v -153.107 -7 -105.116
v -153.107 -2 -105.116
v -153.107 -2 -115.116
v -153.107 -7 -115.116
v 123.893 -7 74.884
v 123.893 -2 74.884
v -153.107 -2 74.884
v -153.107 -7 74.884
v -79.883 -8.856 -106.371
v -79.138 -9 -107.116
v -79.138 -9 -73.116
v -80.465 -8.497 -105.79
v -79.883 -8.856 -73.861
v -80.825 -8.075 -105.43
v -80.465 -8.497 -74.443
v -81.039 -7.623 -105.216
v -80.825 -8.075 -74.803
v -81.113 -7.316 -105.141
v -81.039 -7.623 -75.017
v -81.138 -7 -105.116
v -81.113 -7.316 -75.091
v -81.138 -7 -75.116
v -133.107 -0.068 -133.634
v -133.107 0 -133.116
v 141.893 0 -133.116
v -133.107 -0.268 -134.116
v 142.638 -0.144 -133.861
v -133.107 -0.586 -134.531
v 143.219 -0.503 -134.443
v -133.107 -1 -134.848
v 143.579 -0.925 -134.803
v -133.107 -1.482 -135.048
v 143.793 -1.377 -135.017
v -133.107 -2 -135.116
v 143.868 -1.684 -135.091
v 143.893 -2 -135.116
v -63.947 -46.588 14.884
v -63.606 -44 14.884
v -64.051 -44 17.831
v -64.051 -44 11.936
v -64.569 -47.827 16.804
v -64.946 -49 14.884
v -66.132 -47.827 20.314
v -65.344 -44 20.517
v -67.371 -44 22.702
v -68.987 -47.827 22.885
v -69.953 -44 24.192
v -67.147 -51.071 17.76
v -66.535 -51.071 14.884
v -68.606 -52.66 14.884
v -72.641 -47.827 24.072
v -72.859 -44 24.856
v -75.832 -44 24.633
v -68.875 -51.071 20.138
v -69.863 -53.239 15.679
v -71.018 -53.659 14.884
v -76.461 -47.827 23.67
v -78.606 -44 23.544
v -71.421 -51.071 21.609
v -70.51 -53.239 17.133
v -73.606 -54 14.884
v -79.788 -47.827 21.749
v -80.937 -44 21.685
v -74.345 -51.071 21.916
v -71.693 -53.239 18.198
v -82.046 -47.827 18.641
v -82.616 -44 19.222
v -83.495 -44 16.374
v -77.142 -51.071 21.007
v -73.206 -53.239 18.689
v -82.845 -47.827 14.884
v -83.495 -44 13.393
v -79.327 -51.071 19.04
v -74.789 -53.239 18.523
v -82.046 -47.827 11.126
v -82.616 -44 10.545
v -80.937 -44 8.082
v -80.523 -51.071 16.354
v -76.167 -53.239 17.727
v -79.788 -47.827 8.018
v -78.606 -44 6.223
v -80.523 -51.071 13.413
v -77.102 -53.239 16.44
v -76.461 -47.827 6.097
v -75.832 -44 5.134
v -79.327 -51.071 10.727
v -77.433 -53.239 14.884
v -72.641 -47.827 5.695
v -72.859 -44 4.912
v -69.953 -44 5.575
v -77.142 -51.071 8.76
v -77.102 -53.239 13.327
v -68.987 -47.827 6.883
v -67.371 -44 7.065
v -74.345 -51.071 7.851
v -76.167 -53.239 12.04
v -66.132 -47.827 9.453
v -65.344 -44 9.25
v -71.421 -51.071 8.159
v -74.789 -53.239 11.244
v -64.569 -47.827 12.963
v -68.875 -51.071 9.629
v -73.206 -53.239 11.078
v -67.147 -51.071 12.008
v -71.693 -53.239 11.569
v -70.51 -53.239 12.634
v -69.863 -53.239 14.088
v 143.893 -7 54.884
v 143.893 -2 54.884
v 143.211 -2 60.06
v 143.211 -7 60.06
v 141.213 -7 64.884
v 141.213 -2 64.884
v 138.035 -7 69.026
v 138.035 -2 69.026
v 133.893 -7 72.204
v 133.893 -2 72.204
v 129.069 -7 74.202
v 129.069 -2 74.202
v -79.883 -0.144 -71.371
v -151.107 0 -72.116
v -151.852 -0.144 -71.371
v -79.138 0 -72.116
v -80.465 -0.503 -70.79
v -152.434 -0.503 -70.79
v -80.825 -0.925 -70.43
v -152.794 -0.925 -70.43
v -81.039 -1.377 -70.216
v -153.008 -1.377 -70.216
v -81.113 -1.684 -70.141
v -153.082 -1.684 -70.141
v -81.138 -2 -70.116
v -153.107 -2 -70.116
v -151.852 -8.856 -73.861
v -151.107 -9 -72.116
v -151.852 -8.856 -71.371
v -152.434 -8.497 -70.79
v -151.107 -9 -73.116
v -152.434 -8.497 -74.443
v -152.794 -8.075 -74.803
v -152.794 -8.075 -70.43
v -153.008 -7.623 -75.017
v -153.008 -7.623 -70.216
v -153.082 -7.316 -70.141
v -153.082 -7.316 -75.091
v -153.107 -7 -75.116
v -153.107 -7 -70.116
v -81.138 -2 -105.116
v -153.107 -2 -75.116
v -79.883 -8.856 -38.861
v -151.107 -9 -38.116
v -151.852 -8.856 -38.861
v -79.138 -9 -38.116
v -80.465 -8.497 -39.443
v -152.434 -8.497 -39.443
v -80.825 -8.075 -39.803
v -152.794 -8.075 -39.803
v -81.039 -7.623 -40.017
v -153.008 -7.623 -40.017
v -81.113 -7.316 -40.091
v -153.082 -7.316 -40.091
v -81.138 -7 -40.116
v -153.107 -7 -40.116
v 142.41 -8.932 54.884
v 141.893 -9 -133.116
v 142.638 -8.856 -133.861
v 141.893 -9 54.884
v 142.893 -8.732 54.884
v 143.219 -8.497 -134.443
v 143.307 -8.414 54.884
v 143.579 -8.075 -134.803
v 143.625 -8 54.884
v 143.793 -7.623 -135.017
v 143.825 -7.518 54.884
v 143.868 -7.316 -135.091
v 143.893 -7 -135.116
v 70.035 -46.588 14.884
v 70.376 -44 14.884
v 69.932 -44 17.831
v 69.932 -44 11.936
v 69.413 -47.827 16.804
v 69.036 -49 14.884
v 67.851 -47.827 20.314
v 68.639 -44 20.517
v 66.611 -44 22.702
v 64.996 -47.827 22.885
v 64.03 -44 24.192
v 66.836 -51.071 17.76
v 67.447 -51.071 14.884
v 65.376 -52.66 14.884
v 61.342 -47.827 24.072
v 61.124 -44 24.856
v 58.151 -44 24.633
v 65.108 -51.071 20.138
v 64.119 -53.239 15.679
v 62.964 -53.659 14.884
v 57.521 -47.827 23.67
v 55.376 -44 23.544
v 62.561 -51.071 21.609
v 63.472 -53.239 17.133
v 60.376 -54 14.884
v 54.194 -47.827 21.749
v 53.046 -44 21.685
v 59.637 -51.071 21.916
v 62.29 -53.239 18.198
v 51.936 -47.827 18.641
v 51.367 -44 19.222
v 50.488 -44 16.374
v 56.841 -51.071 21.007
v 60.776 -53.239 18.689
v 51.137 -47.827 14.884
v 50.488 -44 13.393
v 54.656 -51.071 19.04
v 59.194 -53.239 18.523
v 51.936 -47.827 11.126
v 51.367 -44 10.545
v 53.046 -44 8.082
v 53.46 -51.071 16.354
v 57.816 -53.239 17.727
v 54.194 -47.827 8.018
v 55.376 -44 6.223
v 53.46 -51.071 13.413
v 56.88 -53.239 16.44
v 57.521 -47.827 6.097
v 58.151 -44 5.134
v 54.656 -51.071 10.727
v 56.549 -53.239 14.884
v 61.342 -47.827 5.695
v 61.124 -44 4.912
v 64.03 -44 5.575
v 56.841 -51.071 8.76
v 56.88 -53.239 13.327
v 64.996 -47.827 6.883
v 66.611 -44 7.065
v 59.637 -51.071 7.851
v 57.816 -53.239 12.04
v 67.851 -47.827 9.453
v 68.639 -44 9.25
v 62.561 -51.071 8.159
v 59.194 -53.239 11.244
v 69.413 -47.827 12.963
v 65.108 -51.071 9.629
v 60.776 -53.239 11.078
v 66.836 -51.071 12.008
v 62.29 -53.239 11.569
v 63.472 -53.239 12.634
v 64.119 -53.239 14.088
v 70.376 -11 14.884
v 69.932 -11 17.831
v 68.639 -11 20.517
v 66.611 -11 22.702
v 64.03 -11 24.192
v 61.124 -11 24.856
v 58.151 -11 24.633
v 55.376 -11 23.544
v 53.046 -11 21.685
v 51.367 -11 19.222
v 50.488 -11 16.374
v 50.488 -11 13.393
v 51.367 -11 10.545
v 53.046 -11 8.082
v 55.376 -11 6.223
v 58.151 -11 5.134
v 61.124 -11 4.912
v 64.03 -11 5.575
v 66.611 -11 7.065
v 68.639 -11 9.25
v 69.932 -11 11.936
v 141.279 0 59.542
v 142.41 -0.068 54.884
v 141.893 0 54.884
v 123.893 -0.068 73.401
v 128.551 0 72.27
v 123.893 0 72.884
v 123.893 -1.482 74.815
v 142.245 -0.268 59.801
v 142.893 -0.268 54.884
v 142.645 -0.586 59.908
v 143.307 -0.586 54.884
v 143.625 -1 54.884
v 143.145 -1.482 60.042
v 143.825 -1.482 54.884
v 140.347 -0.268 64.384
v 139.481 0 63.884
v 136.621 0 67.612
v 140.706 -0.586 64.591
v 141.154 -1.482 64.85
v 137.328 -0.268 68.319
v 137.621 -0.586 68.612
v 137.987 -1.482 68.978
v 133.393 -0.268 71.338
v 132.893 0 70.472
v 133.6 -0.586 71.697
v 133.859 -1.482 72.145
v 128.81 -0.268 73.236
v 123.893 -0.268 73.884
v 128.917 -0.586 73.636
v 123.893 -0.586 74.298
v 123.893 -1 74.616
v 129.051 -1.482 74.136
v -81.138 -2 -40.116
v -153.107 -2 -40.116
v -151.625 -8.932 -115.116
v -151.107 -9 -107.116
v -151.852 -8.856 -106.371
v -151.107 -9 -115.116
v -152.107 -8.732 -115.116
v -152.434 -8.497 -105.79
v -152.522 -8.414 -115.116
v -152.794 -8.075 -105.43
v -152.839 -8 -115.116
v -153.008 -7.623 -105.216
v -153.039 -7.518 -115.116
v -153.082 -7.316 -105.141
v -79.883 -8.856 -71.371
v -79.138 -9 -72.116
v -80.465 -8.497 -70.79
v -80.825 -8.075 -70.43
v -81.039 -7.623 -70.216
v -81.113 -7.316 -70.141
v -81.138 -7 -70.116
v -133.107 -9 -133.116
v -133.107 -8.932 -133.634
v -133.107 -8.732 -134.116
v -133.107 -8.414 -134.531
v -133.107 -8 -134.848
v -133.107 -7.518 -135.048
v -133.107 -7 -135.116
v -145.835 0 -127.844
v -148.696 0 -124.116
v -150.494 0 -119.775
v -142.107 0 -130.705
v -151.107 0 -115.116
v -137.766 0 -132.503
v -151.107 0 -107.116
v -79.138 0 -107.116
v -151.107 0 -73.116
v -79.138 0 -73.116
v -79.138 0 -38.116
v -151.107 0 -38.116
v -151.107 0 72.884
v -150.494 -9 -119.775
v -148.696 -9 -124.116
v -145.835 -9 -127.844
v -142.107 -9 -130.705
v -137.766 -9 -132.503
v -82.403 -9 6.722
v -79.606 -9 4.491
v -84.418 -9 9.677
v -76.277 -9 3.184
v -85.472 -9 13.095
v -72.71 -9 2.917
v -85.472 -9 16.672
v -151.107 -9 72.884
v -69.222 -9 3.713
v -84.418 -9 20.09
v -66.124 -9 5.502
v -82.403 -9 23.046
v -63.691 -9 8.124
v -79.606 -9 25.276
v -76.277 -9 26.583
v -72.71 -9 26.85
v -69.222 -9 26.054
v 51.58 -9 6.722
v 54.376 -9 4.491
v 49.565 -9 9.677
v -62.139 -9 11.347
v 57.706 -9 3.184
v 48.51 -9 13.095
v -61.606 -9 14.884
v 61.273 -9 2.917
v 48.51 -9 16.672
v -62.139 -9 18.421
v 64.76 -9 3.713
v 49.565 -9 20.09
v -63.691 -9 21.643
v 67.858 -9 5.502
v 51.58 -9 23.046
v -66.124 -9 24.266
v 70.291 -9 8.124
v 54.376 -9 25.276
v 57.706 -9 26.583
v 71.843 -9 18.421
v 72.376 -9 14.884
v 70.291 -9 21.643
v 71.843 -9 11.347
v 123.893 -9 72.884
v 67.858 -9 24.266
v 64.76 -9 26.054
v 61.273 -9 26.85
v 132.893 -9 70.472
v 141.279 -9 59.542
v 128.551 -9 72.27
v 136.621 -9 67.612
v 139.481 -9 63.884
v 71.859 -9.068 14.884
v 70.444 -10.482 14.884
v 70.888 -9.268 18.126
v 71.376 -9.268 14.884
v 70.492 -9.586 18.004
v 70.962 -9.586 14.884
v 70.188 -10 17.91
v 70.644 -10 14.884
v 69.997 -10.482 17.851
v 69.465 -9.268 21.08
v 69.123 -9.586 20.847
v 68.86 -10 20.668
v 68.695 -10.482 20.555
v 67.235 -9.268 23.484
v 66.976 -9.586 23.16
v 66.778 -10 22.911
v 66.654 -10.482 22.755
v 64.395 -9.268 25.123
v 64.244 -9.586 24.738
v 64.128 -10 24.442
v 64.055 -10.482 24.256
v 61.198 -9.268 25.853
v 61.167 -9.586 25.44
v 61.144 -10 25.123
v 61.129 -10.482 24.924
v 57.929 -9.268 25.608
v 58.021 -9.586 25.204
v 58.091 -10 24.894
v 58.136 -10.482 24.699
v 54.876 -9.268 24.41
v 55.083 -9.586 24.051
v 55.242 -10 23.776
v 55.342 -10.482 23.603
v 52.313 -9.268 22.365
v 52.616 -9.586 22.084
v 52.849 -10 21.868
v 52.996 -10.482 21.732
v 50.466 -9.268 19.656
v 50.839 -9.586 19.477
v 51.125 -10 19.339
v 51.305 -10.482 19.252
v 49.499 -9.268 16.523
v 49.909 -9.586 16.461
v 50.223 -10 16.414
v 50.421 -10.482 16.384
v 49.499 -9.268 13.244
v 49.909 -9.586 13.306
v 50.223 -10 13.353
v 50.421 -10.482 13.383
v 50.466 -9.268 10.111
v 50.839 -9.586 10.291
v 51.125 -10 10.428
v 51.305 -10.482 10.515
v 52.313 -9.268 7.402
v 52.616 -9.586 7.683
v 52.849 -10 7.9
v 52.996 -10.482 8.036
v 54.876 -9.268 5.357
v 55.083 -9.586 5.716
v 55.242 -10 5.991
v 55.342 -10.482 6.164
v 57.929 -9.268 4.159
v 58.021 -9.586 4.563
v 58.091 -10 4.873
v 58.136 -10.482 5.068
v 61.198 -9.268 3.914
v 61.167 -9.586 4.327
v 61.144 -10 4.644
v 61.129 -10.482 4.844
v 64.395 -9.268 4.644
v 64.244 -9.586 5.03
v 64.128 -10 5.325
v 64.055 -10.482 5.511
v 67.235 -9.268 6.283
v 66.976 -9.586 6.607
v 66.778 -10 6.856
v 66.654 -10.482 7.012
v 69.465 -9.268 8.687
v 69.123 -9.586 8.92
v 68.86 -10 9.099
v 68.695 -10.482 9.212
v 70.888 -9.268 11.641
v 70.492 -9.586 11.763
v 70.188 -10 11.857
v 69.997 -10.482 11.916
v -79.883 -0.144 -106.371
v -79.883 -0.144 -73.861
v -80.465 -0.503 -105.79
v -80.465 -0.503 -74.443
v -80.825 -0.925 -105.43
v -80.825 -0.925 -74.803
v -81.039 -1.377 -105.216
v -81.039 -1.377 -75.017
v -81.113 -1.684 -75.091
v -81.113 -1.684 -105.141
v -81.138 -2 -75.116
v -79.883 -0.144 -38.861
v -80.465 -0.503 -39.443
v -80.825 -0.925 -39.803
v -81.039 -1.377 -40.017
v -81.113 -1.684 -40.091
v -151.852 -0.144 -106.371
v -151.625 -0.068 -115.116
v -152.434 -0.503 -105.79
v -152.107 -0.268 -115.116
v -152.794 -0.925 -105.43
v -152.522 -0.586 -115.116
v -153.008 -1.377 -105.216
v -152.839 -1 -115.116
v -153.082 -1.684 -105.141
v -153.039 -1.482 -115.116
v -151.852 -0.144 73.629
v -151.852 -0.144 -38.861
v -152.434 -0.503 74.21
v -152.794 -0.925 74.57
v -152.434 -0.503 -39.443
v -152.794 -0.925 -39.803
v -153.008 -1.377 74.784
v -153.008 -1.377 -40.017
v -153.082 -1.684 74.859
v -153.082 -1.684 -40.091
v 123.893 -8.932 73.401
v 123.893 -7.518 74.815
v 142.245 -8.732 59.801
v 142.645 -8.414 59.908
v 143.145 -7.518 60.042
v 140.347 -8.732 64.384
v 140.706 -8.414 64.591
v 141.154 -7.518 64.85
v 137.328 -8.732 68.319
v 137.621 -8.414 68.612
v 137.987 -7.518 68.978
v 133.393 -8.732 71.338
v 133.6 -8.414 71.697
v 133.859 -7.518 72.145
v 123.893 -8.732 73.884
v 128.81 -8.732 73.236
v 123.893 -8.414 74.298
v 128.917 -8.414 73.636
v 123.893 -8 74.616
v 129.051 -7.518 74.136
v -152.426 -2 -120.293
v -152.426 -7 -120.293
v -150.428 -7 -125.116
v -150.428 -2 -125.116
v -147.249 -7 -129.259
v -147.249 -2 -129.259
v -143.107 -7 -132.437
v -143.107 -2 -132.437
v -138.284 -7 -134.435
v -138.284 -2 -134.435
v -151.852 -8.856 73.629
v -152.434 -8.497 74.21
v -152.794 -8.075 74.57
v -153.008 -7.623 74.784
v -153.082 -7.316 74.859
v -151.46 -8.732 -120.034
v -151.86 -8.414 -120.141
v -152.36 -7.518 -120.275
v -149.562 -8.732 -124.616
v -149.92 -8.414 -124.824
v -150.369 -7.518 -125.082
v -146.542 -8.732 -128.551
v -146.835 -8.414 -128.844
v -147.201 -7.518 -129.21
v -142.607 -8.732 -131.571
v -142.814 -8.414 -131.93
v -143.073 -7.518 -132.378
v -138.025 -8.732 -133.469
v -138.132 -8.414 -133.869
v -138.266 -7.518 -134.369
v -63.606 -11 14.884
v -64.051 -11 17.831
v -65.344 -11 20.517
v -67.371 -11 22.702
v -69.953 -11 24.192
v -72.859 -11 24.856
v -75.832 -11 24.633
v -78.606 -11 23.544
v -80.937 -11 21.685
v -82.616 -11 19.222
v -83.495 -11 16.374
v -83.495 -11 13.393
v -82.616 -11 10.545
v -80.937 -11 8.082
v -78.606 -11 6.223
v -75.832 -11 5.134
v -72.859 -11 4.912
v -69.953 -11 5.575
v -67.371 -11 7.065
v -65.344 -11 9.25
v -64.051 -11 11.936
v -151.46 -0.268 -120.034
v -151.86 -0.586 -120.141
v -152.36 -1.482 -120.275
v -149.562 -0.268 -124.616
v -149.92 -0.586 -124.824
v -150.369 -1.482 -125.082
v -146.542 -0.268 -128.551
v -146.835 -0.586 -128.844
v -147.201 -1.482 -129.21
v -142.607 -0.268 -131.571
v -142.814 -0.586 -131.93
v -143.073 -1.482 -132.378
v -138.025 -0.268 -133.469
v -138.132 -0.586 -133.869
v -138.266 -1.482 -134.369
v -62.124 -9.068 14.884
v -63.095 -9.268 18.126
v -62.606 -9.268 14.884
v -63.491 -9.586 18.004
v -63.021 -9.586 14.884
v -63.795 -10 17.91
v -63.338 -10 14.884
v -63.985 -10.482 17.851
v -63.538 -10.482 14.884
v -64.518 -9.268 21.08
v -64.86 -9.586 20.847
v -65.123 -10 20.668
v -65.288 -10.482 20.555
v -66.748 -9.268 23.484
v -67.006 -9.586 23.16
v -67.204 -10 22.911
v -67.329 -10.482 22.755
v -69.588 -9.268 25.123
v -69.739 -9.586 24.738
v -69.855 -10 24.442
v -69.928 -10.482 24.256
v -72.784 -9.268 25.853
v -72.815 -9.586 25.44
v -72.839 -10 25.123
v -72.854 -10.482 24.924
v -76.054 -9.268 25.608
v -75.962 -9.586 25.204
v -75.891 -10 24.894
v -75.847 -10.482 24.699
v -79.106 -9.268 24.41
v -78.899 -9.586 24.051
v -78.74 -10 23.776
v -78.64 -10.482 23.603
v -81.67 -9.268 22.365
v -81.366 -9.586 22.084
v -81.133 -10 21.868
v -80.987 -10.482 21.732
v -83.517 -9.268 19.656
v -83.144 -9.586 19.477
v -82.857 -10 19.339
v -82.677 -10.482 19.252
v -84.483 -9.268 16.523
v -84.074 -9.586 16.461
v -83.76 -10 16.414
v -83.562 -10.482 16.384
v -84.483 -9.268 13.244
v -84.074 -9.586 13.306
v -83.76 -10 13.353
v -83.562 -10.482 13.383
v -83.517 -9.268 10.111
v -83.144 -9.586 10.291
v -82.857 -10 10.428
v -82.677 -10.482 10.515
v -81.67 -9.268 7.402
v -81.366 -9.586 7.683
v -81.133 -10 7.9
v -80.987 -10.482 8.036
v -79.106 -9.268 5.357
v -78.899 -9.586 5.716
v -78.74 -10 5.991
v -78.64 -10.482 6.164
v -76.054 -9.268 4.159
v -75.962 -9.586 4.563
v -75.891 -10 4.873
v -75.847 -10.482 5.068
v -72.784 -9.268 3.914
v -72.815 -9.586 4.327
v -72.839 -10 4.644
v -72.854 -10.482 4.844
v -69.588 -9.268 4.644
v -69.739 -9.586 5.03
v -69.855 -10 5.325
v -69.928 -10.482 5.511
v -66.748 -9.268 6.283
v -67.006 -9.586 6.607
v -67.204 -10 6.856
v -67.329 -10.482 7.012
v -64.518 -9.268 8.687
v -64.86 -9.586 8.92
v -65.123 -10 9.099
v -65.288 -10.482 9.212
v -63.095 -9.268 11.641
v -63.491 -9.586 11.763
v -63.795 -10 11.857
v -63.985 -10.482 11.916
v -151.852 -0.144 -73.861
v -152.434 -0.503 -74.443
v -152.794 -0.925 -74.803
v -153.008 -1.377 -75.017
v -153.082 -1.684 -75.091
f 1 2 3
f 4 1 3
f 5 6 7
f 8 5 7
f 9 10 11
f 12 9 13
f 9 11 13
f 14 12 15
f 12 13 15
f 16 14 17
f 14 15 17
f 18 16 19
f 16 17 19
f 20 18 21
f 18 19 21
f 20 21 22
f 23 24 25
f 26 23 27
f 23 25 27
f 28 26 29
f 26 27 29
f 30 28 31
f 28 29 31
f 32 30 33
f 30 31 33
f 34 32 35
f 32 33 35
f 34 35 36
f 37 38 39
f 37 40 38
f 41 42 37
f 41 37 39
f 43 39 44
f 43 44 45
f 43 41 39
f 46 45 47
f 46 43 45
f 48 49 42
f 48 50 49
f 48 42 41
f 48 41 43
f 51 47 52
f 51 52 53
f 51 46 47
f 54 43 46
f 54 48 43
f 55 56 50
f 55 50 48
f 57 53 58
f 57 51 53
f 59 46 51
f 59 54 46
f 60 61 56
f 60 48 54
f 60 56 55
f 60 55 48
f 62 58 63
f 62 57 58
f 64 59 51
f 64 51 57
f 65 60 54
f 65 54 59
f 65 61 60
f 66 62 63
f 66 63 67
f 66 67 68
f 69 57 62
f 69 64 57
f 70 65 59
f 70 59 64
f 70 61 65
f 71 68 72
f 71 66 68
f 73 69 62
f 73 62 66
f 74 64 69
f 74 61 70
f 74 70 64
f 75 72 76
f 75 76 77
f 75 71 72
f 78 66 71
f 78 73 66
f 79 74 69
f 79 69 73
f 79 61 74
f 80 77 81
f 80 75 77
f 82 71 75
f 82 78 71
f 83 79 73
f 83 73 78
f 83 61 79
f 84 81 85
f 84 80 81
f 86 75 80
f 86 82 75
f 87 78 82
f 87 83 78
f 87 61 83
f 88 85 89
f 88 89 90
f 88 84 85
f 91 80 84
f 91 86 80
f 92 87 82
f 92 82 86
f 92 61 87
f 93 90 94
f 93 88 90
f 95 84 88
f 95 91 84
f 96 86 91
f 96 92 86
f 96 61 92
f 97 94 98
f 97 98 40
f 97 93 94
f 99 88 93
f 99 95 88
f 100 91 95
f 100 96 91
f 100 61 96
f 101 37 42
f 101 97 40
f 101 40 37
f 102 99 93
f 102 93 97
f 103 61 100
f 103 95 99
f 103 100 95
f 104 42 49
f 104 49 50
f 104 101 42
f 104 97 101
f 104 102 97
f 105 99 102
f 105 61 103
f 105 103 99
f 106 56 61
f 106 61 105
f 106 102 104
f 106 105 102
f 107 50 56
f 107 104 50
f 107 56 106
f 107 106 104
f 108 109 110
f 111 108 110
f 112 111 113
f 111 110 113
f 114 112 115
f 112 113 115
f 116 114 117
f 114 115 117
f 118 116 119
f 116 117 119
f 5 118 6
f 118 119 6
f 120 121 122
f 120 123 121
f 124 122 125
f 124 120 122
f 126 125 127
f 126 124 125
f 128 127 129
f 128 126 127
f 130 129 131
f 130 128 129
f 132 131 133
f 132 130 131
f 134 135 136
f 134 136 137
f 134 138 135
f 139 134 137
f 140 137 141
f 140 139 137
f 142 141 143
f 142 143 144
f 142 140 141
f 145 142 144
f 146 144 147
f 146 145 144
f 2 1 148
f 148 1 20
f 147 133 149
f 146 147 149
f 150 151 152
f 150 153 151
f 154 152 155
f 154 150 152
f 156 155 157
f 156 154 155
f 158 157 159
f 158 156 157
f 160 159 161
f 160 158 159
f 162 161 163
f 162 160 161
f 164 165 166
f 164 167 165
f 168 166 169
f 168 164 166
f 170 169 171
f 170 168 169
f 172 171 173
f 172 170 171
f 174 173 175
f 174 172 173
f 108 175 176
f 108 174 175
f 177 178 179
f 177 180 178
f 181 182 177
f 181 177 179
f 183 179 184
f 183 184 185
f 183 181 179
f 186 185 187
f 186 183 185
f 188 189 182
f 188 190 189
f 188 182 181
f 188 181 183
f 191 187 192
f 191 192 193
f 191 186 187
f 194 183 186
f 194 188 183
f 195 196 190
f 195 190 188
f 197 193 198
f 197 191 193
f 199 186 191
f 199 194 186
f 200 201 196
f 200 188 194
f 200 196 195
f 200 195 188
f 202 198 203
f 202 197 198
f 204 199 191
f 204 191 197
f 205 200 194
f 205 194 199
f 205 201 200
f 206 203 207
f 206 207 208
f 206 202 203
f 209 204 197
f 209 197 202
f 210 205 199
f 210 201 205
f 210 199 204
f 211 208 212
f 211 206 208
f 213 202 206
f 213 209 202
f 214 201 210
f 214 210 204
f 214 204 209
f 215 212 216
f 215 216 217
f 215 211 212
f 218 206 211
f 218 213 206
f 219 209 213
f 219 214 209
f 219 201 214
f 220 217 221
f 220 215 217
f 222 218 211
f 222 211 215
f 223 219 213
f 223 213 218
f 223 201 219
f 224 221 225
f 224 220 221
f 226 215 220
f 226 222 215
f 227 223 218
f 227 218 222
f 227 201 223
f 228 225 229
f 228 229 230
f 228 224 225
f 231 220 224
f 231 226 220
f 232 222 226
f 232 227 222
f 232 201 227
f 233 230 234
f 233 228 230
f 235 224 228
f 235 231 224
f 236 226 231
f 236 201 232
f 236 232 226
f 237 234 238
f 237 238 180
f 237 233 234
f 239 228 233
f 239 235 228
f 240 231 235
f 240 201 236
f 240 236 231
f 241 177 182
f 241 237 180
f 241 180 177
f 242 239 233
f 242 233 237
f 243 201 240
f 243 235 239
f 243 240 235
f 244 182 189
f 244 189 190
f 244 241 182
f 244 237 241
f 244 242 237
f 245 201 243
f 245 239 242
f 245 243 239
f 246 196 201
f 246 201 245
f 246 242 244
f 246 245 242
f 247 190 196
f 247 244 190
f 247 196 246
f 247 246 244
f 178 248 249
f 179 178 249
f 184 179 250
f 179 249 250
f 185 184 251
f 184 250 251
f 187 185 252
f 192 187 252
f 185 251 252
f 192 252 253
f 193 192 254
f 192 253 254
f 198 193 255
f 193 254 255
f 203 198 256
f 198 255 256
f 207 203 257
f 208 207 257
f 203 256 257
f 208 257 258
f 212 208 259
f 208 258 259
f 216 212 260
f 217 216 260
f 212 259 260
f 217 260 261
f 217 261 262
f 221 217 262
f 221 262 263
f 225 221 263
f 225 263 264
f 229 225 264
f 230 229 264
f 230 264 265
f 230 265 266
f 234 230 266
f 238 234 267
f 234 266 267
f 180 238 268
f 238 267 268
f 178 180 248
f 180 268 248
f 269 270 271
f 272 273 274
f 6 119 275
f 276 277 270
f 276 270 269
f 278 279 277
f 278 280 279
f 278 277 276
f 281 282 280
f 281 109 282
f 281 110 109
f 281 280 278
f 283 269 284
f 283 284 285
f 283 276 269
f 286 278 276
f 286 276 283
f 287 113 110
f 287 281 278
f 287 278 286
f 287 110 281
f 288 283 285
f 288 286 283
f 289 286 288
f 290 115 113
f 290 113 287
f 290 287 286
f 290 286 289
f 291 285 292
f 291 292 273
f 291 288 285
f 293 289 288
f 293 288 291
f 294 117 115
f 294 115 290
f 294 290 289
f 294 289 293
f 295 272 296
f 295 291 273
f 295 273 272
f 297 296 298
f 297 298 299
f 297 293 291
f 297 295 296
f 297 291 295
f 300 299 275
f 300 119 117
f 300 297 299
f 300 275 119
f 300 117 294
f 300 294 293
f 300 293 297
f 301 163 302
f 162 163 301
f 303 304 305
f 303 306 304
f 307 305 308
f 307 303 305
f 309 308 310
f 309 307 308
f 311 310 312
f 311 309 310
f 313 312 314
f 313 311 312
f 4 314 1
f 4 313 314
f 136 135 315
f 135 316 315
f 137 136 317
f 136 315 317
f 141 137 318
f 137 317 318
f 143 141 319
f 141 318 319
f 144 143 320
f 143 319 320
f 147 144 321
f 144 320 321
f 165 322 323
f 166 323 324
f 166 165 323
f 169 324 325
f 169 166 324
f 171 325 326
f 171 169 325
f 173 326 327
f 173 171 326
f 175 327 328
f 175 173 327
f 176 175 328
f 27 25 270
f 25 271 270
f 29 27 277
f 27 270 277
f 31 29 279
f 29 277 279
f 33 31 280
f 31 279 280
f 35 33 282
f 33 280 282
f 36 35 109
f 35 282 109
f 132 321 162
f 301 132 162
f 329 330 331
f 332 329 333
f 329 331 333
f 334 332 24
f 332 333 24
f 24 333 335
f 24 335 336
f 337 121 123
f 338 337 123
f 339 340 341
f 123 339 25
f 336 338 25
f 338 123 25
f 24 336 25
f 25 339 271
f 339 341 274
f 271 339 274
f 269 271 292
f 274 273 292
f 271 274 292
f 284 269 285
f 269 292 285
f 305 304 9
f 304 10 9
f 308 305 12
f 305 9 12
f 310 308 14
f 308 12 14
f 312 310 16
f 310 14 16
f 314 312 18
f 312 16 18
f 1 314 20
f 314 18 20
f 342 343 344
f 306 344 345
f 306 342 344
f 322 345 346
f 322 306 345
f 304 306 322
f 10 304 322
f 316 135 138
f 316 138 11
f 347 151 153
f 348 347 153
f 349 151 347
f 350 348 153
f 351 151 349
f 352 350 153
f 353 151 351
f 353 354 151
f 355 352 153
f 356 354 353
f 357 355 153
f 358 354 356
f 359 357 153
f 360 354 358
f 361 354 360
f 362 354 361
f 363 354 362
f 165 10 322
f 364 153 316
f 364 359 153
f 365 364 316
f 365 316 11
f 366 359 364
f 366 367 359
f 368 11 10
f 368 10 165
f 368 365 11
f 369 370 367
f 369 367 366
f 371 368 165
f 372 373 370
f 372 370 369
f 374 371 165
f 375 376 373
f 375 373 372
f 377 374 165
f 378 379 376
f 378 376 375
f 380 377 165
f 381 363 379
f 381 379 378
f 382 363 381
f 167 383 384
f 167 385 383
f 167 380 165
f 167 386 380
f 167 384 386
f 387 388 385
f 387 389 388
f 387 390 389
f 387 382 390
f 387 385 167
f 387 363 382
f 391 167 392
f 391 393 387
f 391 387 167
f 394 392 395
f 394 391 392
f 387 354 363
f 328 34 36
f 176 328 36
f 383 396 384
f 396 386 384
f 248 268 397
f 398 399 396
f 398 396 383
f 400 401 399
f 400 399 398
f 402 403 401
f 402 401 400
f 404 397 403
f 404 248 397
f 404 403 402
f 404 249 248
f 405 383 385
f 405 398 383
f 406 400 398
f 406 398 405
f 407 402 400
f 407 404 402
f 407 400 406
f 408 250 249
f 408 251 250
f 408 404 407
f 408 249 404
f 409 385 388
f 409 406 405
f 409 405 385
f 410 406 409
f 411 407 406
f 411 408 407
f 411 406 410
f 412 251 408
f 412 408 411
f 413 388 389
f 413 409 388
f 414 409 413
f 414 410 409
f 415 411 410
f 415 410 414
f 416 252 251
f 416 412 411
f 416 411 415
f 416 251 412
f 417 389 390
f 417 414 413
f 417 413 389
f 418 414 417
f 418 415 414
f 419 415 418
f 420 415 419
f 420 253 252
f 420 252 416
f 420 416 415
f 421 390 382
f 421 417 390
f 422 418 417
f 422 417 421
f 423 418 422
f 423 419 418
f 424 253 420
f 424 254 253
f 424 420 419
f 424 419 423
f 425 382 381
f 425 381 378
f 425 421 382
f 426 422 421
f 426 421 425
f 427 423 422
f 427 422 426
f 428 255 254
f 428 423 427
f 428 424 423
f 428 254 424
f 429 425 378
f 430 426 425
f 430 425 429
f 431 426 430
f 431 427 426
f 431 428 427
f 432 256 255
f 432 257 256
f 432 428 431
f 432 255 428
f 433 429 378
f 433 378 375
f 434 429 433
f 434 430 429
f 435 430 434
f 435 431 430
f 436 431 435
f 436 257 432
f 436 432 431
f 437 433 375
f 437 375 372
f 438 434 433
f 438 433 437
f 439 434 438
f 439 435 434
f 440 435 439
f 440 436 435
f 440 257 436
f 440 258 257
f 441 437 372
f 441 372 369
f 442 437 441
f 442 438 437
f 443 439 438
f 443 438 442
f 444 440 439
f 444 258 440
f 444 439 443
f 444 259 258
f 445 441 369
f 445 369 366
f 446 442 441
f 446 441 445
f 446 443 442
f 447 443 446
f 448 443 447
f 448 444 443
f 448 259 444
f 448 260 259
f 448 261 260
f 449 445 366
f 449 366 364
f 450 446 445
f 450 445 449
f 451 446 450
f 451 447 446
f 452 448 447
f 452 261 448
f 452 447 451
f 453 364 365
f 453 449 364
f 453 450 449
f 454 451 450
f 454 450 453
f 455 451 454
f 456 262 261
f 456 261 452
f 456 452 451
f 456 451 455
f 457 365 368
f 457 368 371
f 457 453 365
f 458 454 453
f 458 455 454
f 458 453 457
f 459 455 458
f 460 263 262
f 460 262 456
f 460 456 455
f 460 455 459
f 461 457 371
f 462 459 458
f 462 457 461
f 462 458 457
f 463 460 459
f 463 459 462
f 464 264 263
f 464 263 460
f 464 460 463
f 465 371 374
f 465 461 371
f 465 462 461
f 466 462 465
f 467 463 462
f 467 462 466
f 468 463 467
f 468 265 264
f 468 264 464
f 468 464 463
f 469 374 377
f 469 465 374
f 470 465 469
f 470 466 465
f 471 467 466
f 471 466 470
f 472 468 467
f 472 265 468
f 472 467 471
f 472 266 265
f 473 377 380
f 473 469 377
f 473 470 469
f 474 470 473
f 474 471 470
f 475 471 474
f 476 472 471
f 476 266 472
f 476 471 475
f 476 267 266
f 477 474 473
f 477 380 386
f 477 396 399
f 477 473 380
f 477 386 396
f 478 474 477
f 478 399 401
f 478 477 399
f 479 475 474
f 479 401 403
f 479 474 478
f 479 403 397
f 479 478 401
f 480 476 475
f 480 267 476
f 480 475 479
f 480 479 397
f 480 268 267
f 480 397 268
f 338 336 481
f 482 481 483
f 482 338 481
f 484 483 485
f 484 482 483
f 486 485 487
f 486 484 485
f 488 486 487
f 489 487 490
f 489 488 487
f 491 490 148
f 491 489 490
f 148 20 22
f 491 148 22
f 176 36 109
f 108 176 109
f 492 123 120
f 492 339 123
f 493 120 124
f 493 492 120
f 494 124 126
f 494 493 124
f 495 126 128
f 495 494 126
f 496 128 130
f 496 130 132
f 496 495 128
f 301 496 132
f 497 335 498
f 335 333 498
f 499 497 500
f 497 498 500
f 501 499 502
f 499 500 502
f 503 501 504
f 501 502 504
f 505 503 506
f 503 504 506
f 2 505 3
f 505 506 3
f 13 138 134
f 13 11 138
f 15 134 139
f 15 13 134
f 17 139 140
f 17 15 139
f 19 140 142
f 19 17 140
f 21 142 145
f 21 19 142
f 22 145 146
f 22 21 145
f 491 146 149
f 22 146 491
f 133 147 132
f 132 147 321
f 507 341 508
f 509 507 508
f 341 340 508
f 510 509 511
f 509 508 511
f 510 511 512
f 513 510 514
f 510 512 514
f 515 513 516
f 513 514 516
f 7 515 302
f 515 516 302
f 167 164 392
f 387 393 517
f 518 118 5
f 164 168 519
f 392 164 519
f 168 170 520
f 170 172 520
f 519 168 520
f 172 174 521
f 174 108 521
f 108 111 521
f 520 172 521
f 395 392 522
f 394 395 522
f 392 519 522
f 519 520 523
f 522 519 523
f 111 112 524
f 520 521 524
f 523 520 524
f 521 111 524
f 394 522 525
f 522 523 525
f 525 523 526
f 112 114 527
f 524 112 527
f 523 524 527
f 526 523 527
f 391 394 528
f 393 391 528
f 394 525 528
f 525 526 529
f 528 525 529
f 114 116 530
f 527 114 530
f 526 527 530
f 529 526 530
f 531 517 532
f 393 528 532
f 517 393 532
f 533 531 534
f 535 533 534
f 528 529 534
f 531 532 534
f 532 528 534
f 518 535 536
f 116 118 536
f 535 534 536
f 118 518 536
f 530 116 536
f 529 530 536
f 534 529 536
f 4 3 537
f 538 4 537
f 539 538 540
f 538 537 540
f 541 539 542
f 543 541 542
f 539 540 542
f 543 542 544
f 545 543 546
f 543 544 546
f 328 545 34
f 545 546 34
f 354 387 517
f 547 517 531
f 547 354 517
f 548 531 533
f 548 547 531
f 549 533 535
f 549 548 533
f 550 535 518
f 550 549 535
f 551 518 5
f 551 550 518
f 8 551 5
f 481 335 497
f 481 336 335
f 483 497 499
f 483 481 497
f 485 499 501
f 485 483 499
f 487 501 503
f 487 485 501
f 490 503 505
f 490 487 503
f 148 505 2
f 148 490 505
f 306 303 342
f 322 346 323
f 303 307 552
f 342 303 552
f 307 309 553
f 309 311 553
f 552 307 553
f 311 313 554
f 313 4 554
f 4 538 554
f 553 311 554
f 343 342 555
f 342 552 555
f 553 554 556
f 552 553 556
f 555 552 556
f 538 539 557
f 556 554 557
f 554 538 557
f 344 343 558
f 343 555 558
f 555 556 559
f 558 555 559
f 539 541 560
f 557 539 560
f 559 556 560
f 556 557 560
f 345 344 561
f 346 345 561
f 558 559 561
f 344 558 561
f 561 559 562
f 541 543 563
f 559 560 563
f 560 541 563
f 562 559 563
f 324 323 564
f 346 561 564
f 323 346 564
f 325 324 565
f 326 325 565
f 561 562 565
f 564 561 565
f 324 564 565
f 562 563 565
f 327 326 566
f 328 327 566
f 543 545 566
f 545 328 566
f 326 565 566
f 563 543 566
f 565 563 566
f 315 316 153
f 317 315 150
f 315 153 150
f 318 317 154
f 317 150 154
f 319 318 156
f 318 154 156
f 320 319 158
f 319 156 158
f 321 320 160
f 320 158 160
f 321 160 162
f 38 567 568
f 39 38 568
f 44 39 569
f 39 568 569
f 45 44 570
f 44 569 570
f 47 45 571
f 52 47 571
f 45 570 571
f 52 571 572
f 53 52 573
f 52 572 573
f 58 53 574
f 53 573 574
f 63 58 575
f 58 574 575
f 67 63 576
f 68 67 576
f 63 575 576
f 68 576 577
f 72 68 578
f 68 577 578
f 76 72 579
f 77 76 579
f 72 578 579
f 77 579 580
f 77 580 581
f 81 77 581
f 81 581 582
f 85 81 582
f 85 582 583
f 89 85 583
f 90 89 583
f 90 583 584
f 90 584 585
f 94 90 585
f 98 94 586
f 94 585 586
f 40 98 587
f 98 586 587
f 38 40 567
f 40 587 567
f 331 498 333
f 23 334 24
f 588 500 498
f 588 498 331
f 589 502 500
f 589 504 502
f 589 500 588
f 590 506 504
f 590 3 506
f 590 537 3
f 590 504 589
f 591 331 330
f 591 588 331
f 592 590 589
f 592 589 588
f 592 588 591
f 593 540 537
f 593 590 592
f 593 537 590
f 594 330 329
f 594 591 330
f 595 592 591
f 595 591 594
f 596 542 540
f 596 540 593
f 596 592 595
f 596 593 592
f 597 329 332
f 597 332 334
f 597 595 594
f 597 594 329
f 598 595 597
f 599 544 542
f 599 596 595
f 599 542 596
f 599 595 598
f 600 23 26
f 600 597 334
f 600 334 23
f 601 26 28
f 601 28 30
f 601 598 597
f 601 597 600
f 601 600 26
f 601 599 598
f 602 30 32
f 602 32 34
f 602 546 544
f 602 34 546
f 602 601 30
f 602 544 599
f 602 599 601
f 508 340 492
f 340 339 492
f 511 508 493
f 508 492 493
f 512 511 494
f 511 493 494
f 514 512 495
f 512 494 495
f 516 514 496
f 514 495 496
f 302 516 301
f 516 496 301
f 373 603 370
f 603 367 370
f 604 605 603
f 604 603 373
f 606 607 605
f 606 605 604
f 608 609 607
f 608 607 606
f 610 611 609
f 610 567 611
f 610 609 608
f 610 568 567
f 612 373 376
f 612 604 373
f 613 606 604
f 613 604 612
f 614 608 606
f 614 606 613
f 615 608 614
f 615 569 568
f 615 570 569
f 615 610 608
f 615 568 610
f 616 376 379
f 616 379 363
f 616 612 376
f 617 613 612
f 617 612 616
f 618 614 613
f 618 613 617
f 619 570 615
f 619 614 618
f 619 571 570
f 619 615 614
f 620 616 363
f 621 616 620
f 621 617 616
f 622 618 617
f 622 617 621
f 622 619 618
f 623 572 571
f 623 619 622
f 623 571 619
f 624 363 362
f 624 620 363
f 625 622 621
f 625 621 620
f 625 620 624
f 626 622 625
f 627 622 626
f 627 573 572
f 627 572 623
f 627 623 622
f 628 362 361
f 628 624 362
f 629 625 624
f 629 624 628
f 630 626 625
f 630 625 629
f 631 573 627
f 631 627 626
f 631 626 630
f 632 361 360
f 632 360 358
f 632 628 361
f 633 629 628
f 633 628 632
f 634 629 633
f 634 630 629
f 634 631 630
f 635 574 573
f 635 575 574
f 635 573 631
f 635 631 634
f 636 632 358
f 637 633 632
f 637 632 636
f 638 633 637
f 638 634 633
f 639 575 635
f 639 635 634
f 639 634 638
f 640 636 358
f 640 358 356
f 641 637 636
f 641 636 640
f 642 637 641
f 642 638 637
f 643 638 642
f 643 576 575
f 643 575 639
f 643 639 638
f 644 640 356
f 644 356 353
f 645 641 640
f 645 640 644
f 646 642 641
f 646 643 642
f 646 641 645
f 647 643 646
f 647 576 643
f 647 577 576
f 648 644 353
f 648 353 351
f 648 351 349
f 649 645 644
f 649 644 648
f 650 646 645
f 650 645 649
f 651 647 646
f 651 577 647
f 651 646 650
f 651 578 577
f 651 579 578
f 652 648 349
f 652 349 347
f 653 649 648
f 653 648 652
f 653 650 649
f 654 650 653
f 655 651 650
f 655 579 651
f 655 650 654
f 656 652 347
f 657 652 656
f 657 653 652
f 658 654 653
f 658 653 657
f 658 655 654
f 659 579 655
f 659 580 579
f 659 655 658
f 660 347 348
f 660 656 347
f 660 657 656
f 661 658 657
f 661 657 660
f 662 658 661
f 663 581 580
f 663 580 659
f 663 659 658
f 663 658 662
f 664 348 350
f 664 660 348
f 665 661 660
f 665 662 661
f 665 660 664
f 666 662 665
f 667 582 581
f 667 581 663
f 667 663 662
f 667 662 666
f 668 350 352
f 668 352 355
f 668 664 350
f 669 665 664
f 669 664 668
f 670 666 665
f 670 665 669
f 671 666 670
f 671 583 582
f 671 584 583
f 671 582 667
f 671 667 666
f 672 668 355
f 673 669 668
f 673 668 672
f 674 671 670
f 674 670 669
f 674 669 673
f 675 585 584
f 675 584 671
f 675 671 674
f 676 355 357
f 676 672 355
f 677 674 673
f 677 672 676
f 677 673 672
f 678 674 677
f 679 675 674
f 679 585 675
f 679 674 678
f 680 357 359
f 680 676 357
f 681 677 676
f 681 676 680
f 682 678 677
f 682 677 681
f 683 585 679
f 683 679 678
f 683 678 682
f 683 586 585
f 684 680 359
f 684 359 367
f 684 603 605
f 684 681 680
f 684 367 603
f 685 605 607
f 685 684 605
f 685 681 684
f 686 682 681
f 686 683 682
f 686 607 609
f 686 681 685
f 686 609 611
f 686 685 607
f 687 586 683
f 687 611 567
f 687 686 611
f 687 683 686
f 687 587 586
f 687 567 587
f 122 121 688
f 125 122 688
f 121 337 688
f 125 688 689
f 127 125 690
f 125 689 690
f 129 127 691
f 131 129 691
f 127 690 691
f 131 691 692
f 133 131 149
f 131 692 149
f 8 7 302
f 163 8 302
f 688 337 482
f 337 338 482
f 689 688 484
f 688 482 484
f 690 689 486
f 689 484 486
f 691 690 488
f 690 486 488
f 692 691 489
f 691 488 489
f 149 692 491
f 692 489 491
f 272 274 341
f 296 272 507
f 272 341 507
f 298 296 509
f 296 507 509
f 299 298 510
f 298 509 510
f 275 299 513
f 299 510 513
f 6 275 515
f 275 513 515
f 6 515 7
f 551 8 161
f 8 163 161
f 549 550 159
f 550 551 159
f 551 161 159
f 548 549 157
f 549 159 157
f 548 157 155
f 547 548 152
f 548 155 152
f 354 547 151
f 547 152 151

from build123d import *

# Parameters (mm, degrees)
F1_DEPTH = 9
F2_R     = 10
F3_DEPTH = 45
F4_W     = 71.969155259
F4_H     = 30
F5_DEPTH = 25
F6_W     = 71.969155259
F6_H     = 30
F7_DEPTH = 25
F8_R     = 2
F9_R     = 2
F10_R    = 10
F11_R    = 10


with BuildPart() as f1:
    # F0 (on Front) → F1 (new body)
    with BuildSketch(Plane.XZ):
        with BuildLine():
            Line((123.8927025199, 74.8835833272), (-153.1072974801, 74.8835833272))
            Line((-153.1072974801, 74.8835833272), (-153.1072974801, -115.1164166728))
            ThreePointArc((-153.1072974801, -115.1164166728), (-147.2494331038, -129.2585522966), (-133.1072974801, -135.1164166728))
            Line((-133.1072974801, -135.1164166728), (143.8927025199, -135.1164166728))
            Line((143.8927025199, -135.1164166728), (143.8927025199, 54.8835833272))
            ThreePointArc((143.8927025199, 54.8835833272), (138.0348381436, 69.0257189509), (123.8927025199, 74.8835833272))
        make_face()
    extrude(amount=F1_DEPTH)

    # F2 (on face) → F3 (join)
    with BuildSketch(Plane.XZ.offset(9)):
        with Locations((60.3762370774, 14.8835833272)):
            Circle(F2_R)
        with Locations((-73.6063314903, 14.8835833272)):
            Circle(F2_R)
    extrude(amount=F3_DEPTH)

    # F4 (on face) → F5 (cut)
    with BuildSketch(Plane.XZ.offset(9)):
        with Locations((-117.1227198506, -90.1164166728)):
            Rectangle(F4_W, F4_H)
    extrude(amount=-F5_DEPTH, mode=Mode.SUBTRACT)

    # F6 (on face) → F7 (cut)
    with BuildSketch(Plane.XZ.offset(9)):
        with Locations((-117.1227198506, -55.1164166728)):
            Rectangle(F6_W, F6_H)
    extrude(amount=-F7_DEPTH, mode=Mode.SUBTRACT)

    # F8
    f8_edges = [f1.edges().sort_by_distance(p)[0] for p in [
        (143.892703, -9, -40.116417),
        (5.392703, -9, -135.116417),
        (-147.249433, -9, -129.258552),
        (-153.107297, -9, -110.116417),
        (-117.12272, -9, -105.116417),
        (-81.138142, -9, -90.116417),
        (-117.12272, -9, -75.116417),
        (-153.107297, -9, -72.616417),
        (-117.12272, -9, -70.116417),
        (-81.138142, -9, -55.116417),
        (-117.12272, -9, -40.116417),
        (-153.107297, -9, 17.383583),
        (-14.607297, -9, 74.883583),
        (138.034838, -9, 69.025719),
        (-83.606331, -9, 14.883583),
        (50.376237, -9, 14.883583),
    ]]
    fillet(f8_edges, radius=F8_R)

    # F9
    f9_edges = [f1.edges().sort_by_distance(p)[0] for p in [
        (143.892703, 0, -40.116417),
        (5.392703, 0, -135.116417),
        (-147.249433, 0, -129.258552),
        (-153.107297, 0, -110.116417),
        (-117.12272, 0, -105.116417),
        (-81.138142, 0, -90.116417),
        (-117.12272, 0, -75.116417),
        (-153.107297, 0, -72.616417),
        (-117.12272, 0, -70.116417),
        (-81.138142, 0, -55.116417),
        (-117.12272, 0, -40.116417),
        (-153.107297, 0, 17.383583),
        (-14.607297, 0, 74.883583),
        (138.034838, 0, 69.025719),
    ]]
    fillet(f9_edges, radius=F9_R)

    # F10
    f10_edges = [f1.edges().sort_by_distance(p)[0] for p in [
        (-83.606331, -54, 14.883583),
    ]]
    fillet(f10_edges, radius=F10_R)

    # F11
    f11_edges = [f1.edges().sort_by_distance(p)[0] for p in [
        (50.376237, -54, 14.883583),
    ]]
    fillet(f11_edges, radius=F11_R)


solid = f1.part
